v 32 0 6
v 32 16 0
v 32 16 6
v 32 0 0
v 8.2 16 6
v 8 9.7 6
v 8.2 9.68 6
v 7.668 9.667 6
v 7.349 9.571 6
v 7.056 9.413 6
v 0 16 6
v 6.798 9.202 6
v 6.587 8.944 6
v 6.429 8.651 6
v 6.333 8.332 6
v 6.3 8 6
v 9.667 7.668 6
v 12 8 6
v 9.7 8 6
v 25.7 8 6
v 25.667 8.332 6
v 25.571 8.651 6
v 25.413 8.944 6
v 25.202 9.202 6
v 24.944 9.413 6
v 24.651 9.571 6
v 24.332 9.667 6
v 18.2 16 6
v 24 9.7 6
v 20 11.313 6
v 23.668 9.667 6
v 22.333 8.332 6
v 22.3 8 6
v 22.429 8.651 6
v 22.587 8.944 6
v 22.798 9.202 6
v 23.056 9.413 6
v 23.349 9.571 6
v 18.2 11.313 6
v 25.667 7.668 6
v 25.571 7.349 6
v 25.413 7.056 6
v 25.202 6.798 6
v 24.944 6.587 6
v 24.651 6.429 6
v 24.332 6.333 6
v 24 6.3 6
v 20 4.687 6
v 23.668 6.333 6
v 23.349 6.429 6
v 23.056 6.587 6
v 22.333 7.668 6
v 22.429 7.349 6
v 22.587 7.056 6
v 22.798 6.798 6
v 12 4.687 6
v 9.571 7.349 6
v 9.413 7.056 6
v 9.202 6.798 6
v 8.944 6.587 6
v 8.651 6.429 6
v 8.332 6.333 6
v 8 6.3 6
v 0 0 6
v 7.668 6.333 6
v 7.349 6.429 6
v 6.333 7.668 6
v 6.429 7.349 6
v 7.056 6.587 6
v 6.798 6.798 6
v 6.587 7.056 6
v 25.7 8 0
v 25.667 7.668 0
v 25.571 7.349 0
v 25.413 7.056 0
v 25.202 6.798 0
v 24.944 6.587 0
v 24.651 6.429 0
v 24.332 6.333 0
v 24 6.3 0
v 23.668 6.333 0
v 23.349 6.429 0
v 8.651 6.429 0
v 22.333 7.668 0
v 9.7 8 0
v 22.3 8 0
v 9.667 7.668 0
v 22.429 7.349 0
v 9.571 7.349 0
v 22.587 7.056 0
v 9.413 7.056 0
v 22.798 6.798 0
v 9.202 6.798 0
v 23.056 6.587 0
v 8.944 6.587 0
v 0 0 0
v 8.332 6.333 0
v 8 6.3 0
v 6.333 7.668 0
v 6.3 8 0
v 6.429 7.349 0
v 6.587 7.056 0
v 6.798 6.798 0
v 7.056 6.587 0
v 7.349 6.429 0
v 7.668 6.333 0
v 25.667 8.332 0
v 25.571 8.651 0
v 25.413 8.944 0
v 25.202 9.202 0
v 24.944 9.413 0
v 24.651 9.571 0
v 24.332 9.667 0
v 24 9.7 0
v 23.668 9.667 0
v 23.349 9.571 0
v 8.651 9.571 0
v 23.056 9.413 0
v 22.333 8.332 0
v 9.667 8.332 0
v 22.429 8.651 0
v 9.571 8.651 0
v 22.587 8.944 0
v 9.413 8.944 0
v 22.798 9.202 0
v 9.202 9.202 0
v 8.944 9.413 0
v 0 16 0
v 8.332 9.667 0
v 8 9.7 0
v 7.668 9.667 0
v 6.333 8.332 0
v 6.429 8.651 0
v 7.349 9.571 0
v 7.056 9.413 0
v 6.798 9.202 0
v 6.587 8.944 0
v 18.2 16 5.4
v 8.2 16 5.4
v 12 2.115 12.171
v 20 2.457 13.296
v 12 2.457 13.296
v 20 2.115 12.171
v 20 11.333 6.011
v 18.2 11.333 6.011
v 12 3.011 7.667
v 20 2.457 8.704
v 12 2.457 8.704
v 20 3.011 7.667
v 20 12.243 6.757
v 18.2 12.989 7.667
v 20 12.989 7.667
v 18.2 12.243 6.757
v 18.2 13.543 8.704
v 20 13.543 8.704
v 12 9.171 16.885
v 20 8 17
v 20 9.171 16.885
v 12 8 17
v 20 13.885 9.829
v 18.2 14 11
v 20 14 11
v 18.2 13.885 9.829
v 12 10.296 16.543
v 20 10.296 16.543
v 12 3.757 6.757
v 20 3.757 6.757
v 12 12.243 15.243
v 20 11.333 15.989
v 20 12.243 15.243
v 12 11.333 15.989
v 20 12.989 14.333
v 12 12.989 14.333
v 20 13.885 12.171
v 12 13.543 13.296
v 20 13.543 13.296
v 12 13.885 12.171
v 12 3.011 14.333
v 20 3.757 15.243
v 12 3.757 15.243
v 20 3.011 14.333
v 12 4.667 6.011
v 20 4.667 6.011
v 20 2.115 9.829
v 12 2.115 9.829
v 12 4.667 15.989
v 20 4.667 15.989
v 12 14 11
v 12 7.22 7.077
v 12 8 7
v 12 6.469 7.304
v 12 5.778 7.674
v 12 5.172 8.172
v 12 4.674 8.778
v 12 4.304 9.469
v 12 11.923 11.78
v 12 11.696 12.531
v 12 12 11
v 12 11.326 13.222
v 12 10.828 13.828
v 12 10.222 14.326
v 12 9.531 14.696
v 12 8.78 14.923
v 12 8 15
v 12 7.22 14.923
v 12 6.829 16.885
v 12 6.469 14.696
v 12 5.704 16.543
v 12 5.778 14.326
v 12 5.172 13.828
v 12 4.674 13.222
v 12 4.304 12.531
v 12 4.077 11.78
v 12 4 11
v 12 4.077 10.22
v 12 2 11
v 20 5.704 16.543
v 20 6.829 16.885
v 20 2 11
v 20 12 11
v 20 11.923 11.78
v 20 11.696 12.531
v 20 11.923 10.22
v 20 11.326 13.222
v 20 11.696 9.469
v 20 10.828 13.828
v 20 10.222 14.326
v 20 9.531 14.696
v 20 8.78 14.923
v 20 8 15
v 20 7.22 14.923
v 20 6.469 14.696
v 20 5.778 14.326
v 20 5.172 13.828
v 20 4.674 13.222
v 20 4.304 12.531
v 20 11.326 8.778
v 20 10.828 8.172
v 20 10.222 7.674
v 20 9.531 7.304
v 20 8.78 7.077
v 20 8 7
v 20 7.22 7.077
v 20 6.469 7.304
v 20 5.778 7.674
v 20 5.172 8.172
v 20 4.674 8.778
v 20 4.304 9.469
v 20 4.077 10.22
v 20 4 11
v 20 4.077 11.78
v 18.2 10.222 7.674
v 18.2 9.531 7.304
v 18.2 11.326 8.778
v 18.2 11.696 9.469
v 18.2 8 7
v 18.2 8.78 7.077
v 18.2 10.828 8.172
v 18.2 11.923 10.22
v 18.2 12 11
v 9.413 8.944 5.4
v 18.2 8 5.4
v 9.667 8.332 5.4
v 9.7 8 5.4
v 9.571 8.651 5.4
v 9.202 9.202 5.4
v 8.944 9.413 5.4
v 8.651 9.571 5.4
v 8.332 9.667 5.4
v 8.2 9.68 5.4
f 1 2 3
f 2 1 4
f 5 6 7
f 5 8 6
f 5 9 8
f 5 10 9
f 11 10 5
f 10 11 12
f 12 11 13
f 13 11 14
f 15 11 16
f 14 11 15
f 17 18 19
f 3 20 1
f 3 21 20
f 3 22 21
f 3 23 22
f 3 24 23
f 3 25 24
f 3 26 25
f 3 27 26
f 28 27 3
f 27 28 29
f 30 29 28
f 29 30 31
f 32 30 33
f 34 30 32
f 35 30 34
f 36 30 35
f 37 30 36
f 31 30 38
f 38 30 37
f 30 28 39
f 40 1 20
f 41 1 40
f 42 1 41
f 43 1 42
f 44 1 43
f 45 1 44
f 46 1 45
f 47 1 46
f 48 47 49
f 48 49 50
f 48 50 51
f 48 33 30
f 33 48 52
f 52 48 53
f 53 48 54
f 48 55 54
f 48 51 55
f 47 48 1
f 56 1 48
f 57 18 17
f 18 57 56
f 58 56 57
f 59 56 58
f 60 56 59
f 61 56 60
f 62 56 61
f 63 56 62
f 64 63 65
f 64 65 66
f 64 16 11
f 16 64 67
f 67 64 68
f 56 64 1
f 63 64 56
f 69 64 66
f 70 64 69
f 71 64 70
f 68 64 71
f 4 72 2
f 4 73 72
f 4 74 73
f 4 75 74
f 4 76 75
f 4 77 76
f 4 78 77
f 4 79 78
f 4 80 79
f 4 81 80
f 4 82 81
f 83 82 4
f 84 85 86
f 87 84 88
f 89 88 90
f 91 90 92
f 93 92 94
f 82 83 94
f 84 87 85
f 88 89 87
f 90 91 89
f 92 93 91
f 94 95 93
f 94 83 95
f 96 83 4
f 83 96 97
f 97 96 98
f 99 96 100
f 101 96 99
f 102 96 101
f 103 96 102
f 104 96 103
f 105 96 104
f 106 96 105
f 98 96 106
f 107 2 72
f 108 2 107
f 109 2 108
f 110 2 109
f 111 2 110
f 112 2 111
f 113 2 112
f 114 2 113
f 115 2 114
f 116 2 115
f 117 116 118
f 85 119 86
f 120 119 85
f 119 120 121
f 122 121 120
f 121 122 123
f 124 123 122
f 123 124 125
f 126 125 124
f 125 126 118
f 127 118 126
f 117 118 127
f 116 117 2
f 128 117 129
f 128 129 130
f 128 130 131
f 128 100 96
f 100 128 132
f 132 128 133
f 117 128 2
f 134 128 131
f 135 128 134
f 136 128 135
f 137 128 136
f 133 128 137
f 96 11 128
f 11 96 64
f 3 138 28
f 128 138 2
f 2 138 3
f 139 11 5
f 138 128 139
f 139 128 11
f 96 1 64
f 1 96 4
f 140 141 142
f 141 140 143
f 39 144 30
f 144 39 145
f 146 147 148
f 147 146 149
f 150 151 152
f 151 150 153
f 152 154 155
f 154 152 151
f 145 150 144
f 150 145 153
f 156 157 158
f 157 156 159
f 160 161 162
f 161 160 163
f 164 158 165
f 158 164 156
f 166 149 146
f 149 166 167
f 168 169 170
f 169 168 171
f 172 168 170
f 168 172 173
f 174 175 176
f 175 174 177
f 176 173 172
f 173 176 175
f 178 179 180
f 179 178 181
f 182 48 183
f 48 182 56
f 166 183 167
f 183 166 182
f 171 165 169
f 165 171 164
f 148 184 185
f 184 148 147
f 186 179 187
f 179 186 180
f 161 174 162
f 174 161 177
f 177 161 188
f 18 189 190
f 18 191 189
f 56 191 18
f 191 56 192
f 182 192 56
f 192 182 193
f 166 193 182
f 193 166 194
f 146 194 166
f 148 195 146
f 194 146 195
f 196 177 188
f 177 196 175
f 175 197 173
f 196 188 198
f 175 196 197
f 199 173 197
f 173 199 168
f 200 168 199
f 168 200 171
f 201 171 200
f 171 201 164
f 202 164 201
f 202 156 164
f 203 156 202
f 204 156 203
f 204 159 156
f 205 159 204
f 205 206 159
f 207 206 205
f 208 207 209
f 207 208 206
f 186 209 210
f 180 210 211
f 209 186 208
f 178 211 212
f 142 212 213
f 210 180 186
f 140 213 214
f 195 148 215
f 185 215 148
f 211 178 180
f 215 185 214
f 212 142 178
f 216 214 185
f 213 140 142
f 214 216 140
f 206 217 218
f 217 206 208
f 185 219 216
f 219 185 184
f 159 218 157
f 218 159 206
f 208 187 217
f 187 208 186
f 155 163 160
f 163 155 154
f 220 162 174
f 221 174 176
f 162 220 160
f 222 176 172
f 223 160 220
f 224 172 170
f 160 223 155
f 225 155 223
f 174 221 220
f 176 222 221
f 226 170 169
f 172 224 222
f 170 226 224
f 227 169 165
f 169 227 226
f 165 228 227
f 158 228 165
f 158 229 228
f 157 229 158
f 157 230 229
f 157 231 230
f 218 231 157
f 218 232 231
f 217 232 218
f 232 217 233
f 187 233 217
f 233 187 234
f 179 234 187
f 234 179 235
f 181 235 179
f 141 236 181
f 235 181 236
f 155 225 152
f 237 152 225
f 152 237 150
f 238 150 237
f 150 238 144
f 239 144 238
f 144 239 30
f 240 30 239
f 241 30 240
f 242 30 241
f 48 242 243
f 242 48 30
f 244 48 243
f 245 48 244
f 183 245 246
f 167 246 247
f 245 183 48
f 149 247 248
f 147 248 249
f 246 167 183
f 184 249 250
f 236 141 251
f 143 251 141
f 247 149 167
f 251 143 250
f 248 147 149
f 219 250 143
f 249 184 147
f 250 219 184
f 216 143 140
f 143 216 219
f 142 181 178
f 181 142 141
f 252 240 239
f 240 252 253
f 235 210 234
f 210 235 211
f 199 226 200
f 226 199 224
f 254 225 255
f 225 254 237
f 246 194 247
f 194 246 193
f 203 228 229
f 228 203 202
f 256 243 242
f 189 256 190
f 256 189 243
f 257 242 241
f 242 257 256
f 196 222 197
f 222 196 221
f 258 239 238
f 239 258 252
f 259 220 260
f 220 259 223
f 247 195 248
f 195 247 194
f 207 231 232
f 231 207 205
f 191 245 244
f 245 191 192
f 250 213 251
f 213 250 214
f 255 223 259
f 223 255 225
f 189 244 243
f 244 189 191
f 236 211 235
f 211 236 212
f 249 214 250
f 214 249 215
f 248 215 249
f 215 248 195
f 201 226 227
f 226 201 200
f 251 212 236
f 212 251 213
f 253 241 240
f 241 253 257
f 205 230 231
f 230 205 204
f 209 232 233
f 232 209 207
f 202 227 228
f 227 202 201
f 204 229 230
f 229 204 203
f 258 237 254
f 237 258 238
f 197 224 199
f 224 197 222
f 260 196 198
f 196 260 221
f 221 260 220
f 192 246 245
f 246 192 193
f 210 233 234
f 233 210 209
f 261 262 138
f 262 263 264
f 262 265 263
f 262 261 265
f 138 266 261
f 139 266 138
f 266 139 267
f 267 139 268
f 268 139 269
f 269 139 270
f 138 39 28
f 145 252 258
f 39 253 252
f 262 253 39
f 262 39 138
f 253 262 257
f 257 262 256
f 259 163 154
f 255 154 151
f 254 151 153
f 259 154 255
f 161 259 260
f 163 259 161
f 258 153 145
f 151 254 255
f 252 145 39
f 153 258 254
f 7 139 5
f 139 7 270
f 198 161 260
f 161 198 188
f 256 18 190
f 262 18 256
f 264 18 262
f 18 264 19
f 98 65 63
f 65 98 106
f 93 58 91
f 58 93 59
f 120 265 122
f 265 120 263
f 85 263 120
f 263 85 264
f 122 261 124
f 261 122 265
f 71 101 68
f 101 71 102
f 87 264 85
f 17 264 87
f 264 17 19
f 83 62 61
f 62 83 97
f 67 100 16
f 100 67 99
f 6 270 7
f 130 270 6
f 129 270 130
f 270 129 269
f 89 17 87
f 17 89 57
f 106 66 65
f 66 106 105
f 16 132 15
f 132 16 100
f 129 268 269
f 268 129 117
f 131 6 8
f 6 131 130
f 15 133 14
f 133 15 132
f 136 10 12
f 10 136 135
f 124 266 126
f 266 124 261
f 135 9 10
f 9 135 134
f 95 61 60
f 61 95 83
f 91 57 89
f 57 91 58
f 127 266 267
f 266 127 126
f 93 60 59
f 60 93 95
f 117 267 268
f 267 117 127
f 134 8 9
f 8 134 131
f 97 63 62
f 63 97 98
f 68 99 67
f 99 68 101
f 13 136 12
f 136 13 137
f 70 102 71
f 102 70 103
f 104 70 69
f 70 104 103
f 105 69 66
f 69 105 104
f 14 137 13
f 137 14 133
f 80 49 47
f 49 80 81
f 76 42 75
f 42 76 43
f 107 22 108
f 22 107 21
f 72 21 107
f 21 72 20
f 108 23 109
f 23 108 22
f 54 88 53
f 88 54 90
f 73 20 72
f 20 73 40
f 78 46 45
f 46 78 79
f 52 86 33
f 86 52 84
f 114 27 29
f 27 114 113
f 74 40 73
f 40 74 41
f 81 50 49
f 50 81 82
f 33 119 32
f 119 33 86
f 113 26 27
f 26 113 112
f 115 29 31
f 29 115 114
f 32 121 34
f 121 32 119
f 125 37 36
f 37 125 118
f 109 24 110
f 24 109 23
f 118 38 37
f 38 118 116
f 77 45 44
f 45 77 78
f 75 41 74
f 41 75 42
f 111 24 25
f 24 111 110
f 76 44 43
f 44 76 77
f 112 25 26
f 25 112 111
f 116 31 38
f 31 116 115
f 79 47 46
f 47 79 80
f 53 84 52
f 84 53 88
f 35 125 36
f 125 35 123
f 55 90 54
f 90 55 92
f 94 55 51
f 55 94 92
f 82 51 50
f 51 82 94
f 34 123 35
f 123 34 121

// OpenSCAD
$fn = 32;

// ----------------------------------------------------------------------
// Cable clip: cable 8 mm, clamp 12 mm, base 32 mm
// ----------------------------------------------------------------------

// --- parameters (mm) ---
plate_x = 32;             // base length, X
plate_y = 16;             // base width, Y
plate_t = 6;              // base thickness
wire_seat_d = 12;         // clamp outside diameter
clip_t = 2;               // clamp wall
cable_d = 8;              // cable opening
ring_w = 8;               // clamp width along the cable
screw_d = 3.4;            // screw clearance
throat = 5.6;             // snap throat width
sink = 1;                 // overlap of the clamp into the base

module base() {
  cube([plate_x, plate_y, plate_t]);
}

module clamp() {
  translate([plate_x / 2, plate_y / 2, plate_t + wire_seat_d / 2 - sink]) rotate([0, 90, 0])
    cylinder(h = ring_w, d = wire_seat_d, center = true);
}

difference() {
  union() {
    base();
    clamp();
  }
  translate([plate_x / 2, plate_y / 2, plate_t + wire_seat_d / 2 - sink]) rotate([0, 90, 0]) translate([0, 0, -ring_w / 2 - 1]) cylinder(h = ring_w + 2, d = cable_d);
  /* snap throat: the opening is narrower than the cable */
  translate([plate_x / 2 - throat / 2, plate_y / 2, plate_t + wire_seat_d / 2 - sink]) rotate([0, 90, 0]) translate([0, 0, -ring_w / 2 - 1]) cube([throat, wire_seat_d + 2, ring_w + 2]);
  translate([8, plate_y / 2, -1]) cylinder(h = plate_t + 2, d = screw_d);
  translate([24, plate_y / 2, -1]) cylinder(h = plate_t + 2, d = screw_d);
}
